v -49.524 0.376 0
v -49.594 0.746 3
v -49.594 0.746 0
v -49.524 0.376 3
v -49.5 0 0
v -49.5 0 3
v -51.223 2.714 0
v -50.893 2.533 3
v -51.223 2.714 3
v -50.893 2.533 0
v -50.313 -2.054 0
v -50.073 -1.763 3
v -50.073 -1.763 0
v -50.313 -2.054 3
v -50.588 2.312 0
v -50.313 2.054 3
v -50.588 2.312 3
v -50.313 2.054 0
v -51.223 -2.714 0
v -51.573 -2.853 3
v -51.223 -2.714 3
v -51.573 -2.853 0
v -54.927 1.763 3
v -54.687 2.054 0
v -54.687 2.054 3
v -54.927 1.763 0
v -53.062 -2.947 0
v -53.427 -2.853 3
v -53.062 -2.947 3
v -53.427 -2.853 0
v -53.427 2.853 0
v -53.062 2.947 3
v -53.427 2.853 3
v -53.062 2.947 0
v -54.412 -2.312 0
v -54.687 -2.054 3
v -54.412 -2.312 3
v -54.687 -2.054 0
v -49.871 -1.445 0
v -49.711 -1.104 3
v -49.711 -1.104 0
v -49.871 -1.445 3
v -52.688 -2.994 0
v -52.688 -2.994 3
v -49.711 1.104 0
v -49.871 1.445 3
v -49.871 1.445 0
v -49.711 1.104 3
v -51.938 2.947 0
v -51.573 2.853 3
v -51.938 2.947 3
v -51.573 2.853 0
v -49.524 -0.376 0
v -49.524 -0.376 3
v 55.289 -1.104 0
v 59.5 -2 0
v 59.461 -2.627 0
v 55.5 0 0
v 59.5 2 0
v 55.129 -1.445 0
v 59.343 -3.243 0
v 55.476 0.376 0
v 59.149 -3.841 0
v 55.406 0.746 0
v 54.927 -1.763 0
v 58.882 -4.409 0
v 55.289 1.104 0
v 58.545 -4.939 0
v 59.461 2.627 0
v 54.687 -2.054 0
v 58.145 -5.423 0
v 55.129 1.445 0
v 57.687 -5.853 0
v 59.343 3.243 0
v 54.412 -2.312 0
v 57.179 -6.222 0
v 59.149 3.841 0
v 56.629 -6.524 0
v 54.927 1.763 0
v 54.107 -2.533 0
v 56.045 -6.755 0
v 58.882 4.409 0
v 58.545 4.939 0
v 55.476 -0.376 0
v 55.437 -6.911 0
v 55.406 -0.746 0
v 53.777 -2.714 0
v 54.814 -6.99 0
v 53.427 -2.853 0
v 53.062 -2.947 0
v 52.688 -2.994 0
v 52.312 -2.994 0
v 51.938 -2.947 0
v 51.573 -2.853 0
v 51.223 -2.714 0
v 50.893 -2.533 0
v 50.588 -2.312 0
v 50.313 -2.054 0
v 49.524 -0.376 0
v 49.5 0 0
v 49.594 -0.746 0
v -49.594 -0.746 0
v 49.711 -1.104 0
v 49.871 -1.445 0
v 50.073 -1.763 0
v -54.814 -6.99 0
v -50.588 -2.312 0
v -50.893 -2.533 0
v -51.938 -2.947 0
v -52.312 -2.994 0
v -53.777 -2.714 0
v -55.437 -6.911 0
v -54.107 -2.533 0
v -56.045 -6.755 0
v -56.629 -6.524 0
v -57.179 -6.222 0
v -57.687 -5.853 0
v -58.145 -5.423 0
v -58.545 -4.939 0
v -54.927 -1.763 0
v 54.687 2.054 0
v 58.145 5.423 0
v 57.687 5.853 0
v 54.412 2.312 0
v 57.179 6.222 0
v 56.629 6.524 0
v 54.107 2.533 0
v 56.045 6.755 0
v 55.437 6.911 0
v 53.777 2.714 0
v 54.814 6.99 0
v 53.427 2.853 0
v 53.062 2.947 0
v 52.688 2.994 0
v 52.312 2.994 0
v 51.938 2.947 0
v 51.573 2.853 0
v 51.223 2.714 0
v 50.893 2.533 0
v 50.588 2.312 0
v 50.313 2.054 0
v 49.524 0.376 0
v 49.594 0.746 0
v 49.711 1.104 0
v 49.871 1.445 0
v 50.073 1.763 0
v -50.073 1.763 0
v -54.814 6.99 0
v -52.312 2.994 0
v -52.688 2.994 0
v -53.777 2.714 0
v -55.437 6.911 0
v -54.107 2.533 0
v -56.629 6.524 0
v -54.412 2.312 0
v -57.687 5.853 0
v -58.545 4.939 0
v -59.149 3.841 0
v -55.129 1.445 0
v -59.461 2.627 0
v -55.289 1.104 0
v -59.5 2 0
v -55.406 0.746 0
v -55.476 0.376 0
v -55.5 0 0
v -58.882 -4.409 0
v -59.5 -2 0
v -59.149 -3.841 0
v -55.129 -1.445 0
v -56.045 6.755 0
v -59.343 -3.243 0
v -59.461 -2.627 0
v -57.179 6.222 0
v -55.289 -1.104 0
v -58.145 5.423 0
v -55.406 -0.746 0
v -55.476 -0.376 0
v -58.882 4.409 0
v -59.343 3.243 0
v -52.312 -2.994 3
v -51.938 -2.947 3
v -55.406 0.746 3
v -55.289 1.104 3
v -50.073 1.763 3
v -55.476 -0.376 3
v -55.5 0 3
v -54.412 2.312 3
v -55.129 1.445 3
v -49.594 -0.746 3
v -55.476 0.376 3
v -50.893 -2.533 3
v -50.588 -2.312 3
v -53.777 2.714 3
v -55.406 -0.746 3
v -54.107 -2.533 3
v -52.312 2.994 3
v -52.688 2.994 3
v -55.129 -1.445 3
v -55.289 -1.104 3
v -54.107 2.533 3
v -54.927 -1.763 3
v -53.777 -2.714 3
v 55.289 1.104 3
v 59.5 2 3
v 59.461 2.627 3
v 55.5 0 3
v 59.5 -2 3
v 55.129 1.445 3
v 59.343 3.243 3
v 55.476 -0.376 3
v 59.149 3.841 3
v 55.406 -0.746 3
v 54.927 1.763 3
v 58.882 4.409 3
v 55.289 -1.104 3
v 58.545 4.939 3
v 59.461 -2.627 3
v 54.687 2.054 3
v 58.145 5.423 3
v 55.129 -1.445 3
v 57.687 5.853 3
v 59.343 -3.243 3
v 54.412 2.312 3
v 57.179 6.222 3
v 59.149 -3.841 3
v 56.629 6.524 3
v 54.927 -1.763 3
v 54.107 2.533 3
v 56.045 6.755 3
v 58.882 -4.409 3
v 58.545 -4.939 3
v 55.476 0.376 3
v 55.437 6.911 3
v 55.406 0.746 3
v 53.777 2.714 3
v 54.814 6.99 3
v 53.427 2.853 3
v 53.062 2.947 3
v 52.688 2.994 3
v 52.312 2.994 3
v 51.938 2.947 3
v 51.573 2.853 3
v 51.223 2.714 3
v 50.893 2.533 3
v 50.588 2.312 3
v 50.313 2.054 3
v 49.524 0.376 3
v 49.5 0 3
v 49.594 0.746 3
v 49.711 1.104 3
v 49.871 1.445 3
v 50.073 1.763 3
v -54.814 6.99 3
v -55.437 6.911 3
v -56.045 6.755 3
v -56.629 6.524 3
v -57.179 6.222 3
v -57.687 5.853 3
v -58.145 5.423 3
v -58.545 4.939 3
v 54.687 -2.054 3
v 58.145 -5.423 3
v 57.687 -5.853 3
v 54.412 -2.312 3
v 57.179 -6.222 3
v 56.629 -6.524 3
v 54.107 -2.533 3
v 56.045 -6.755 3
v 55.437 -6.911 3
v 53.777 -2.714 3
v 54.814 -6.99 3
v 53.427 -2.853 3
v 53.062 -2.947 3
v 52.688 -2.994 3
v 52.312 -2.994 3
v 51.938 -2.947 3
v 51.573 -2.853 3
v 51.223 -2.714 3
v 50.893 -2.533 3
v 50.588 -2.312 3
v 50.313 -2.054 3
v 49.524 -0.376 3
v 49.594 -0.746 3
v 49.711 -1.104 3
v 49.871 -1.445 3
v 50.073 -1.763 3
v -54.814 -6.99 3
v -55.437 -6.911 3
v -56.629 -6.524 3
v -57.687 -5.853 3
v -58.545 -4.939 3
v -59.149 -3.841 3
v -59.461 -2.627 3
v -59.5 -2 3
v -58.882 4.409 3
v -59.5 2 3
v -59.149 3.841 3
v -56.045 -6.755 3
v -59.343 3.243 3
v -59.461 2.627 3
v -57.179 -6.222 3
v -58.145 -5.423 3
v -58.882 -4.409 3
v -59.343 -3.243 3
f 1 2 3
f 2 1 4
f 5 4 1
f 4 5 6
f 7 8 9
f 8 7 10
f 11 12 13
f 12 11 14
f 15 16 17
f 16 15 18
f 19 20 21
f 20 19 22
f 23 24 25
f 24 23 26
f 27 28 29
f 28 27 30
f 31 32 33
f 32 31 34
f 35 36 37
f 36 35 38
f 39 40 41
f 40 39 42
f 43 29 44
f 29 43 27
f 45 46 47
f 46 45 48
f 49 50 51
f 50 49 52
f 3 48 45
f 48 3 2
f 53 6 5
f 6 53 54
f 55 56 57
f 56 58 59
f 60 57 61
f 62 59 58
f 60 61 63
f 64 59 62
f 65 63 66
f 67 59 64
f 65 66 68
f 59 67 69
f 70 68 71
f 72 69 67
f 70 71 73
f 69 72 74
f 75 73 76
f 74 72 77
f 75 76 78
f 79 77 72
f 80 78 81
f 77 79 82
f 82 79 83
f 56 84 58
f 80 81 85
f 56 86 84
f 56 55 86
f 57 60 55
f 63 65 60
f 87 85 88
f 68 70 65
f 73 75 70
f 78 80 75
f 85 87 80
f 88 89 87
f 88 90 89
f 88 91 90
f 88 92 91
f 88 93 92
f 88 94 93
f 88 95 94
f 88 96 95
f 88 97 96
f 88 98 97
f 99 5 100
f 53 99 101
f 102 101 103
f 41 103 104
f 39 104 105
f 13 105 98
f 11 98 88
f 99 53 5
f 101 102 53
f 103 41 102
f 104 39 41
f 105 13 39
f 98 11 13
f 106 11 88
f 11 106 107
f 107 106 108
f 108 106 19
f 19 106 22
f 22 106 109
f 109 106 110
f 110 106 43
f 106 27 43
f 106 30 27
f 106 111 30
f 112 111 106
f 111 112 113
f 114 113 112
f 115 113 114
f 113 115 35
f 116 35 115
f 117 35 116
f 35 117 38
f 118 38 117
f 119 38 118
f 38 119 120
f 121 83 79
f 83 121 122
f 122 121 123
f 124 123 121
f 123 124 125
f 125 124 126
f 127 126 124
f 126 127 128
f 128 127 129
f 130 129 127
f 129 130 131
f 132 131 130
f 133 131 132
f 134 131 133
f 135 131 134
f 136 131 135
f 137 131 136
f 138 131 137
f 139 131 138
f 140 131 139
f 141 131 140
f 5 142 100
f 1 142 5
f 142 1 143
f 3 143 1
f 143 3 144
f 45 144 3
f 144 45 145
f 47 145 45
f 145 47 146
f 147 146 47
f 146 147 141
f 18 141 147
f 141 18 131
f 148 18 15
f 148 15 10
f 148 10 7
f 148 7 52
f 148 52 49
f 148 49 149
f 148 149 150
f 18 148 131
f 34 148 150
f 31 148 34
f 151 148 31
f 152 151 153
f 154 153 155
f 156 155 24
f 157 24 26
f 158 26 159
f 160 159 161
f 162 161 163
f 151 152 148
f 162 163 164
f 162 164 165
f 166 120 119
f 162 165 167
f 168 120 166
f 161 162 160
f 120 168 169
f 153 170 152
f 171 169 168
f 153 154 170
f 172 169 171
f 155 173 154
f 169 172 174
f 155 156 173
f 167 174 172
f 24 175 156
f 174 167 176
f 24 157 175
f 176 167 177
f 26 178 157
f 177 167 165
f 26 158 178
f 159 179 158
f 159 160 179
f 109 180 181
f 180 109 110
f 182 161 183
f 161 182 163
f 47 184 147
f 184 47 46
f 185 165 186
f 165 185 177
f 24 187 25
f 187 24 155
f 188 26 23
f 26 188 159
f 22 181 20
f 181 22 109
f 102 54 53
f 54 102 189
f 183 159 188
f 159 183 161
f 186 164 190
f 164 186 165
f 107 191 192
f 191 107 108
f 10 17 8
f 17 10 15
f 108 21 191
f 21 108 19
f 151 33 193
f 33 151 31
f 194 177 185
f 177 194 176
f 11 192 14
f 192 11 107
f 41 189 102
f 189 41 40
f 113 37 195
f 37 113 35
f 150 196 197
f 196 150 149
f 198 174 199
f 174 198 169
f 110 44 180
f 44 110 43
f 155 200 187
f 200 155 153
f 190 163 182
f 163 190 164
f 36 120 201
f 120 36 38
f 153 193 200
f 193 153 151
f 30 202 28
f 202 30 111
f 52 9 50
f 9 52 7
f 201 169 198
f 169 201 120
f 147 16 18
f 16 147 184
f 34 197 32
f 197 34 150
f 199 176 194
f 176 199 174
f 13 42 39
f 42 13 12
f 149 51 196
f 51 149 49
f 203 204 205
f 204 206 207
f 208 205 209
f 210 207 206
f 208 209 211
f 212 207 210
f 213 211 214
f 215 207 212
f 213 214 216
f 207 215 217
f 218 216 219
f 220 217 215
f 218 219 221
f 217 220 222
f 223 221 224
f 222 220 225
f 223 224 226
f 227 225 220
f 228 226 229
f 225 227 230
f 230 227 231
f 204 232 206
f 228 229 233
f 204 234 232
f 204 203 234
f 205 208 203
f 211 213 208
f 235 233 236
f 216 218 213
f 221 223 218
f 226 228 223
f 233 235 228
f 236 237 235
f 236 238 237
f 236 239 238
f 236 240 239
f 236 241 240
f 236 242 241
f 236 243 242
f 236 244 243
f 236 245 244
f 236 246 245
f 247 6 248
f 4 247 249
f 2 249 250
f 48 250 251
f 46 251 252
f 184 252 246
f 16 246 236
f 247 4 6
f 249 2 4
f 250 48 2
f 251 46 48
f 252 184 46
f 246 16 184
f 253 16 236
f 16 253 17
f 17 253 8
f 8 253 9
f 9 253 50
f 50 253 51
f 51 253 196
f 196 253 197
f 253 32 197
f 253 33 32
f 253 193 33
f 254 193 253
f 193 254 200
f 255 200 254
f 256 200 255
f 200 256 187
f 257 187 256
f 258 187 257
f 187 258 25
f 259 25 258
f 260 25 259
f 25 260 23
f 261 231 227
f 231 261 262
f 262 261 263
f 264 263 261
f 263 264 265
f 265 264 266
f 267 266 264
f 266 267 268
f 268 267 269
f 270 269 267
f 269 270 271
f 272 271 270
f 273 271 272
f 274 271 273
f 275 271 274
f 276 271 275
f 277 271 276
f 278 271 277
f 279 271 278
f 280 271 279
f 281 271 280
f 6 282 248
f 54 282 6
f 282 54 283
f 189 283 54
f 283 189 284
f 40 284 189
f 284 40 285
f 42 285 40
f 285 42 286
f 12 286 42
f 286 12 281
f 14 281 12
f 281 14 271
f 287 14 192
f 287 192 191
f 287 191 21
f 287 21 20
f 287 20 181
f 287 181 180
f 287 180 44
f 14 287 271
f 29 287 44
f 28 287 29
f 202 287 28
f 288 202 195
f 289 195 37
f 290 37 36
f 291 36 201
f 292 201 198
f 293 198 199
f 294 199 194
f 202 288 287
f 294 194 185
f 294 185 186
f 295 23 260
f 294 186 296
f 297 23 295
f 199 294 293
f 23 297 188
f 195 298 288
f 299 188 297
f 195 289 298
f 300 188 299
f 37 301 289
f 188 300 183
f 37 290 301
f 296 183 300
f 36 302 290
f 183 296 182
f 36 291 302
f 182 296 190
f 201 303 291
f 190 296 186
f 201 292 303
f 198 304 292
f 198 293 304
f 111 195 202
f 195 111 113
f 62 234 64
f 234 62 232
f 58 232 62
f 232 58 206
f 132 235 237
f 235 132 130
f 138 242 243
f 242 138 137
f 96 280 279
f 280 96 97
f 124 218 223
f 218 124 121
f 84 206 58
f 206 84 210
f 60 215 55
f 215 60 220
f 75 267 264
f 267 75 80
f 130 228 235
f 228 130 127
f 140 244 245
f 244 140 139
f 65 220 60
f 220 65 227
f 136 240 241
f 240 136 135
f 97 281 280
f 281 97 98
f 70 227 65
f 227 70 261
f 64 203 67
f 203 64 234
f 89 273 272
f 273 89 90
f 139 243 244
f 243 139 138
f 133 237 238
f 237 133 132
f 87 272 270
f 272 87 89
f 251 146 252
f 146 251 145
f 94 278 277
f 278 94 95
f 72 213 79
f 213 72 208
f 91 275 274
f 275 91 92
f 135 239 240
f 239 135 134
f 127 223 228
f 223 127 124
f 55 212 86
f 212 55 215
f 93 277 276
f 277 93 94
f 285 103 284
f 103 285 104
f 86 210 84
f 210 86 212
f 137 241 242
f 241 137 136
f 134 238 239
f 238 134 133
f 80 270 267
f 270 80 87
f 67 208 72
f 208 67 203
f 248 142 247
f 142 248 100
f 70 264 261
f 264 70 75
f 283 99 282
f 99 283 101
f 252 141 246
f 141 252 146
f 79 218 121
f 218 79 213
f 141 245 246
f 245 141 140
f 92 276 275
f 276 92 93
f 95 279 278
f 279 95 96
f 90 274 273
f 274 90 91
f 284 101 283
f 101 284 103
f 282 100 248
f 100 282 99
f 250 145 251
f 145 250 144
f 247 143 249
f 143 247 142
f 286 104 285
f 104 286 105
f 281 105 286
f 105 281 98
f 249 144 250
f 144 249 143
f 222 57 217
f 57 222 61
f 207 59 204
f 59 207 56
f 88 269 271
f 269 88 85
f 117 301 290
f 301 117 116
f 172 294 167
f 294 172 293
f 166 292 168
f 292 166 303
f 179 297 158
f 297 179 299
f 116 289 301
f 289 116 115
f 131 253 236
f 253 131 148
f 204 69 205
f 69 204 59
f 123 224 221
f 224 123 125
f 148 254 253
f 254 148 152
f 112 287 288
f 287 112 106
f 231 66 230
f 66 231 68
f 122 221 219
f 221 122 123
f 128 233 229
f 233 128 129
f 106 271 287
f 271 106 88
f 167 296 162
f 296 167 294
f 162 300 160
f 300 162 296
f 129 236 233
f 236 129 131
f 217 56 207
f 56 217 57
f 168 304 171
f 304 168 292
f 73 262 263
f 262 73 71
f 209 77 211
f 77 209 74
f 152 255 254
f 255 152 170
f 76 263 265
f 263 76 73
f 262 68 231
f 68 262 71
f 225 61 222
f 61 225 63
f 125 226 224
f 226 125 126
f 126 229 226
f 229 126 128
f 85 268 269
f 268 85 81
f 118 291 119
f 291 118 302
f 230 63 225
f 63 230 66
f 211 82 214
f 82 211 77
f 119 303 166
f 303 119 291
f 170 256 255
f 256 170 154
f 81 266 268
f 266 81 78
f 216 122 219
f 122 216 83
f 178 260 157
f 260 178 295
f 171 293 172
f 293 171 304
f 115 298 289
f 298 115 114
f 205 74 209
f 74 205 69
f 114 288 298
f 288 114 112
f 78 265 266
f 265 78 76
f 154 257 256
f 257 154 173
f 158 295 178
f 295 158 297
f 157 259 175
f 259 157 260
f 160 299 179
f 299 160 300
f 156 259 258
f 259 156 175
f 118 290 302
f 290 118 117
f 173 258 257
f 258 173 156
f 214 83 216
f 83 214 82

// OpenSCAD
$fn = 50;


difference() {
	union() {
		hull() {
			translate(v = [-54.5000000000, 2.0000000000, 0]) {
				cylinder(h = 3, r = 5);
			}
			translate(v = [54.5000000000, 2.0000000000, 0]) {
				cylinder(h = 3, r = 5);
			}
			translate(v = [-54.5000000000, -2.0000000000, 0]) {
				cylinder(h = 3, r = 5);
			}
			translate(v = [54.5000000000, -2.0000000000, 0]) {
				cylinder(h = 3, r = 5);
			}
		}
	}
	union() {
		translate(v = [-52.5000000000, 0.0000000000, 0]) {
			cylinder(h = 3, r = 3.0000000000);
		}
		translate(v = [52.5000000000, 0.0000000000, 0]) {
			cylinder(h = 3, r = 3.0000000000);
		}
		translate(v = [-52.5000000000, 0.0000000000, 0]) {
			cylinder(h = 3, r = 1.5000000000);
		}
		translate(v = [52.5000000000, 0.0000000000, 0]) {
			cylinder(h = 3, r = 1.5000000000);
		}
		translate(v = [-52.5000000000, 0.0000000000, 0]) {
			cylinder(h = 3, r = 1.5000000000);
		}
		translate(v = [52.5000000000, 0.0000000000, 0]) {
			cylinder(h = 3, r = 1.5000000000);
		}
		translate(v = [-52.5000000000, 0.0000000000, 0]) {
			cylinder(h = 3, r = 1.5000000000);
		}
		translate(v = [52.5000000000, 0.0000000000, 0]) {
			cylinder(h = 3, r = 1.5000000000);
		}
	}
}
